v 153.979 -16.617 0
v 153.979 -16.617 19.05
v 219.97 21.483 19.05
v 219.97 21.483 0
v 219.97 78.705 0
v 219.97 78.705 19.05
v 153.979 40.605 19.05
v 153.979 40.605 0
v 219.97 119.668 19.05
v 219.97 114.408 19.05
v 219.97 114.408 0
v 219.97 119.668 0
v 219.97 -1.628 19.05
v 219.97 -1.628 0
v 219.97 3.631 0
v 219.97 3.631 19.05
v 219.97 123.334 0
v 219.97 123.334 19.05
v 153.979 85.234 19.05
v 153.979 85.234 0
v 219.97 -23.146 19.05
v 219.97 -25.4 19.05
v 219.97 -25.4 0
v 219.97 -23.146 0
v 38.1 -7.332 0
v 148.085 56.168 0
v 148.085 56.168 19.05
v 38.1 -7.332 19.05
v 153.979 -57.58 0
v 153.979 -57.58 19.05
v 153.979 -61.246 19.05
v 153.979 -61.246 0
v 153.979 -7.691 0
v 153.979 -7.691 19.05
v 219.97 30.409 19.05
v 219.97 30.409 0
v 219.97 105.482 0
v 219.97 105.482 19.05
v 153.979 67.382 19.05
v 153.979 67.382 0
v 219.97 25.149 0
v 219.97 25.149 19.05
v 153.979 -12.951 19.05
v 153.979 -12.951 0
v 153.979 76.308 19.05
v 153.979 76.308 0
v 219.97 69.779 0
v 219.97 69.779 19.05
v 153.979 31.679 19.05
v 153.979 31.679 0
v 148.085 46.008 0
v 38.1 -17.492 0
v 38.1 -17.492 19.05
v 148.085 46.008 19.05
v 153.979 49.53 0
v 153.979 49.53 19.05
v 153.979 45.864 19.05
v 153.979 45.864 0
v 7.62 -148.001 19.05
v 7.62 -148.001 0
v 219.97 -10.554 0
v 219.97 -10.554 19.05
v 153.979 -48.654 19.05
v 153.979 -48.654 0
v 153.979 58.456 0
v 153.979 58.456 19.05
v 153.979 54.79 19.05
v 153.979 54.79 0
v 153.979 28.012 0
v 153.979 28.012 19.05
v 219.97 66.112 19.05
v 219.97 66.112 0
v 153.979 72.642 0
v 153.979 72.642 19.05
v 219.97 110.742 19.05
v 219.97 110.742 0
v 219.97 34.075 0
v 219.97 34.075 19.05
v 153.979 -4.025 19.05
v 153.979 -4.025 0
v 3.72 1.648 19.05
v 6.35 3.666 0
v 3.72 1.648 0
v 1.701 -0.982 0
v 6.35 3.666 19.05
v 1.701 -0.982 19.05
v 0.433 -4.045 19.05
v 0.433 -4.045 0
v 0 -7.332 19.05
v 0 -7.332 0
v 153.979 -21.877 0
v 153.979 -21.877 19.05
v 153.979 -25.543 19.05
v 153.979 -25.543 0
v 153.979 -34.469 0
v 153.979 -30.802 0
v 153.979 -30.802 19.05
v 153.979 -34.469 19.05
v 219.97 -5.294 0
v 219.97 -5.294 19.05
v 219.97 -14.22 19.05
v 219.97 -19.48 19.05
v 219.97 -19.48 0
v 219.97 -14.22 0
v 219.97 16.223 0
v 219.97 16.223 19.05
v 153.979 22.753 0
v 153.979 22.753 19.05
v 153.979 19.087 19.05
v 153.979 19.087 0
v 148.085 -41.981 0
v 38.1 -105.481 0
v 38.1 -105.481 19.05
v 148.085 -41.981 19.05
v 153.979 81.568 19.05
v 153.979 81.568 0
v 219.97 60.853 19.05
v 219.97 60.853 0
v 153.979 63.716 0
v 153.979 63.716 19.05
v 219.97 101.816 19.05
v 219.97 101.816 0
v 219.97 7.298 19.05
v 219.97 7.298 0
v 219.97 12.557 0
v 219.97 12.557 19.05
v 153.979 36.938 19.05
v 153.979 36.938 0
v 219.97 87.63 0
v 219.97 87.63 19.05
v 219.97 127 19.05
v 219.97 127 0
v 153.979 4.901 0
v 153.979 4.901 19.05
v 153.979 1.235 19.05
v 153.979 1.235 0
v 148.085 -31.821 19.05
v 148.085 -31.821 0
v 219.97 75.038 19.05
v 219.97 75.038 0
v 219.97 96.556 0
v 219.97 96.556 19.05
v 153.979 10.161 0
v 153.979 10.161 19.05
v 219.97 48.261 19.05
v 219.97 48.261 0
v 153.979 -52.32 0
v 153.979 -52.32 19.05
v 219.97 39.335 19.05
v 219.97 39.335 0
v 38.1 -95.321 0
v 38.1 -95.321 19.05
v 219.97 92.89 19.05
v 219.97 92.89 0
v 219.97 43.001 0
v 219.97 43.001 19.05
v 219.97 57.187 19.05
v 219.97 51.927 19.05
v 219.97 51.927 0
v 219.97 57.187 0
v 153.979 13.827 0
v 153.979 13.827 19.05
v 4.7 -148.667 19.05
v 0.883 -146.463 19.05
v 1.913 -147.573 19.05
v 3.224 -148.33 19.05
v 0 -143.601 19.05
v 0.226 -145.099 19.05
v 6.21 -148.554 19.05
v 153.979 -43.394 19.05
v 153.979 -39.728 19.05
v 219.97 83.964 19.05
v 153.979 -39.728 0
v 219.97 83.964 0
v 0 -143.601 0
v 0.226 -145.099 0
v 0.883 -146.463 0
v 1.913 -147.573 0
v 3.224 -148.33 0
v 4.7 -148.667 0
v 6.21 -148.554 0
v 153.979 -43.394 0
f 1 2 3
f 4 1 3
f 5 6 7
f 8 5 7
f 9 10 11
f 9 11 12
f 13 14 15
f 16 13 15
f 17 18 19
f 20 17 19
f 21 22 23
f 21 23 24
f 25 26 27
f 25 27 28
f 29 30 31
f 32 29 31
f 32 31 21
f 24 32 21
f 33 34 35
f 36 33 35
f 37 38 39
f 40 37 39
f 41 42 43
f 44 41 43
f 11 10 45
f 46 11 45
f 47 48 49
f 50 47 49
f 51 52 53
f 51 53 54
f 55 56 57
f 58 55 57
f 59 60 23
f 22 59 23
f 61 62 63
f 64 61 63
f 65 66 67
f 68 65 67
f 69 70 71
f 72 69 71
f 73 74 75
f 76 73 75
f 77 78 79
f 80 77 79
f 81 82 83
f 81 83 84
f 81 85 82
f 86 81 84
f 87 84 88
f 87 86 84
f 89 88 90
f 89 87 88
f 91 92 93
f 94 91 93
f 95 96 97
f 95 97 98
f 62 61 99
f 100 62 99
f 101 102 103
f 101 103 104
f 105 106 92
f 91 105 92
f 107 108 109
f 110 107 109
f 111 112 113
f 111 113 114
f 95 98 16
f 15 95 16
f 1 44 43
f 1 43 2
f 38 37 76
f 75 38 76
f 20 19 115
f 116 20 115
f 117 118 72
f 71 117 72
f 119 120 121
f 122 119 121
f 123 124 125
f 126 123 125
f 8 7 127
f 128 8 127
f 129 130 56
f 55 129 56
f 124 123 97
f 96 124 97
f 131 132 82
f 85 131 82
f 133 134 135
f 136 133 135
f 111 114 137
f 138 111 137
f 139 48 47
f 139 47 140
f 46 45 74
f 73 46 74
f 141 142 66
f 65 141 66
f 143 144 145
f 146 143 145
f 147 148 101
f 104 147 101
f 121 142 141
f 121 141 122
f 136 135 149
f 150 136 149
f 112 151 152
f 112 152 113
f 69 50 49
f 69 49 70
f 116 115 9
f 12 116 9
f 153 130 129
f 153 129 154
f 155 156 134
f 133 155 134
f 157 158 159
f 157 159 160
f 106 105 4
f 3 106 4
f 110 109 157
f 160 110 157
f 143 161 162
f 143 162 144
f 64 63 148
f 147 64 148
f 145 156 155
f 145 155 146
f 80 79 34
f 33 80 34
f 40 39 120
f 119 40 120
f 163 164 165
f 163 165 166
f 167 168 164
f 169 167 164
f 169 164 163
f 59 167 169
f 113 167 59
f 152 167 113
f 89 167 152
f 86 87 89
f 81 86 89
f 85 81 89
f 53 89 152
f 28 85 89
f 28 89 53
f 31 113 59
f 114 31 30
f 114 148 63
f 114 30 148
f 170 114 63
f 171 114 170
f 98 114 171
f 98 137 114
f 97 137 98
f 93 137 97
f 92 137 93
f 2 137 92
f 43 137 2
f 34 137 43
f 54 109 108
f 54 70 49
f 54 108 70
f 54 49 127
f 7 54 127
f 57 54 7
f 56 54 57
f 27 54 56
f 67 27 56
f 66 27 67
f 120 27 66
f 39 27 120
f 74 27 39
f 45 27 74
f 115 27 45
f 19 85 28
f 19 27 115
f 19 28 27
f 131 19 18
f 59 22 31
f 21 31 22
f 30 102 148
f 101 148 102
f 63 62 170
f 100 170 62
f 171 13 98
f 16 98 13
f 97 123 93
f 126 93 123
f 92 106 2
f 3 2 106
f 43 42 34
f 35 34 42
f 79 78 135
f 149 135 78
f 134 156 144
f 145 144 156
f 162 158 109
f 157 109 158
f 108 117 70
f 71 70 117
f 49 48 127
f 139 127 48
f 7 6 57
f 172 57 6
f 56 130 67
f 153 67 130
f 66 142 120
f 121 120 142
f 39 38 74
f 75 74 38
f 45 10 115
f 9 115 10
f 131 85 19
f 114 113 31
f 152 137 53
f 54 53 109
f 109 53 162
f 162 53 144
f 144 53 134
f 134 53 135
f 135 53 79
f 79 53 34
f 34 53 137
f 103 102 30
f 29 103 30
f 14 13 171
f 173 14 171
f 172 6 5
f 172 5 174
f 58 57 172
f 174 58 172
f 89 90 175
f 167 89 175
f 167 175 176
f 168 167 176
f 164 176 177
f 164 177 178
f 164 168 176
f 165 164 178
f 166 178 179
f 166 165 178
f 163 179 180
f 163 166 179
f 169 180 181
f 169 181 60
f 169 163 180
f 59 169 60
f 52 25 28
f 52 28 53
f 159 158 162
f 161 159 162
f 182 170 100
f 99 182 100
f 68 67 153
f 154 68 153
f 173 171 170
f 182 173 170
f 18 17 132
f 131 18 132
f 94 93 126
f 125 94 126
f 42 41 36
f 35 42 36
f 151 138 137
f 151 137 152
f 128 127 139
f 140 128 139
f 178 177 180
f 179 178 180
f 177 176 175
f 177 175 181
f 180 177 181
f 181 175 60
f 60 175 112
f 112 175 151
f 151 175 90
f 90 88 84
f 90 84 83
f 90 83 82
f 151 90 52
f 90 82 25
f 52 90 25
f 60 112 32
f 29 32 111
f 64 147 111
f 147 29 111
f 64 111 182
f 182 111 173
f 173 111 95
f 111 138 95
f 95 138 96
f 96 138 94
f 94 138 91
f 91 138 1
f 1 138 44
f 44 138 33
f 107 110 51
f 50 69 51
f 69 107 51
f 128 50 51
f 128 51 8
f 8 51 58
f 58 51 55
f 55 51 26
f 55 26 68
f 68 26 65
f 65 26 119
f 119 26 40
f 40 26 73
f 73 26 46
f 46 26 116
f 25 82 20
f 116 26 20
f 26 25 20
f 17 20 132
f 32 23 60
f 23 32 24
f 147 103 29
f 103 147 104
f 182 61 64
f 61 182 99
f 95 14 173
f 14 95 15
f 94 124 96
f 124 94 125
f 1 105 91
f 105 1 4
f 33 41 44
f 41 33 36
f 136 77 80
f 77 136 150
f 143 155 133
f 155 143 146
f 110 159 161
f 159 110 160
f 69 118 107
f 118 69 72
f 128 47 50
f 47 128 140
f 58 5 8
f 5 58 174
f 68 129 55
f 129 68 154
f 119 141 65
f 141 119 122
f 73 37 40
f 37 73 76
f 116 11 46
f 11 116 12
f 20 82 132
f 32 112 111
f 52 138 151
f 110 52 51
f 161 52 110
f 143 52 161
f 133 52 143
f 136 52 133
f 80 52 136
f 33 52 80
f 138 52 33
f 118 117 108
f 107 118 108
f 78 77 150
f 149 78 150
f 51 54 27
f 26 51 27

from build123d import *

# Parameters (mm, degrees)
F2_DEPTH = 19.05
F3_DEPTH = 25.4
F5_DEPTH = 25.4
F6_R     = 12.7
F7_R     = 5.08


with BuildPart() as f2:
    # F0 (on Top) → F2 (new body)
    with BuildSketch(Plane.XY):
        Polygon((219.970453, 127), (0, 0), (0, -152.4), (219.970453, -25.4), align=None)
    extrude(amount=F2_DEPTH)

    # F1 (on face) → F3 (cut)
    with BuildSketch(Plane.XY):
        Polygon((148.085226, 56.167652), (38.1, -7.332348), (38.1, -17.492348), (148.085226, 46.007652), align=None)
        Polygon((38.1, -105.480529), (148.085226, -41.980529), (148.085226, -31.820529), (38.1, -95.320529), align=None)
    extrude(amount=F3_DEPTH, mode=Mode.SUBTRACT)

    # F4 (on face) → F5 (cut)
    with BuildSketch(Plane.XY.offset(19.05)):
        Polygon((219.970453, 119.667652), (219.970453, 123.333826), (153.979317, 85.233826), (153.979317, 81.567652), align=None)
        Polygon((219.970453, 114.407963), (153.979317, 76.307963), (153.979317, 72.641788), (219.970453, 110.741788), align=None)
        Polygon((219.970453, 105.4821), (153.979317, 67.3821), (153.979317, 63.715925), (219.970453, 101.815925), align=None)
        Polygon((219.970453, 96.556236), (153.979317, 58.456236), (153.979317, 54.790062), (219.970453, 92.890062), align=None)
        Polygon((219.970453, 87.630373), (153.979317, 49.530373), (153.979317, 45.864199), (219.970453, 83.964199), align=None)
        Polygon((219.970453, 78.70451), (153.979317, 40.60451), (153.979317, 36.938336), (219.970453, 75.038336), align=None)
        Polygon((219.970453, 69.778647), (153.979317, 31.678647), (153.979317, 28.012473), (219.970453, 66.112473), align=None)
        Polygon((219.970453, 60.852784), (153.979317, 22.752784), (153.979317, 19.08661), (219.970453, 57.18661), align=None)
        Polygon((219.970453, 51.926921), (153.979317, 13.826921), (153.979317, 10.160747), (219.970453, 48.260747), align=None)
        Polygon((219.970453, 43.001058), (153.979317, 4.901058), (153.979317, 1.234883), (219.970453, 39.334883), align=None)
        Polygon((219.970453, 34.075195), (153.979317, -4.024805), (153.979317, -7.69098), (219.970453, 30.40902), align=None)
        Polygon((219.970453, 25.149331), (153.979317, -12.950669), (153.979317, -16.616843), (219.970453, 21.483157), align=None)
        Polygon((219.970453, 16.223468), (153.979317, -21.876532), (153.979317, -25.542706), (219.970453, 12.557294), align=None)
        Polygon((219.970453, 7.297605), (153.979317, -30.802395), (153.979317, -34.468569), (219.970453, 3.631431), align=None)
        Polygon((219.970453, -1.628258), (153.979317, -39.728258), (153.979317, -43.394432), (219.970453, -5.294432), align=None)
        Polygon((219.970453, -10.554121), (153.979317, -48.654121), (153.979317, -52.320295), (219.970453, -14.220295), align=None)
        Polygon((219.970453, -19.479984), (153.979317, -57.579984), (153.979317, -61.246158), (219.970453, -23.146158), align=None)
        Polygon((219.970453, -28.405847), (153.979317, -66.505847), (153.979317, -70.172022), (219.970453, -32.072022), align=None)
        Polygon((219.970453, -37.33171), (153.979317, -75.43171), (153.979317, -79.097885), (219.970453, -40.997885), align=None)
    extrude(amount=-F5_DEPTH, mode=Mode.SUBTRACT)

    # F6
    f6_edges = [f2.edges().sort_by_distance(p)[0] for p in [
        (0, 0, 9.525),
    ]]
    fillet(f6_edges, radius=F6_R)

    # F7
    f7_edges = [f2.edges().sort_by_distance(p)[0] for p in [
        (0, -152.4, 9.525),
    ]]
    fillet(f7_edges, radius=F7_R)


solid = f2.part
